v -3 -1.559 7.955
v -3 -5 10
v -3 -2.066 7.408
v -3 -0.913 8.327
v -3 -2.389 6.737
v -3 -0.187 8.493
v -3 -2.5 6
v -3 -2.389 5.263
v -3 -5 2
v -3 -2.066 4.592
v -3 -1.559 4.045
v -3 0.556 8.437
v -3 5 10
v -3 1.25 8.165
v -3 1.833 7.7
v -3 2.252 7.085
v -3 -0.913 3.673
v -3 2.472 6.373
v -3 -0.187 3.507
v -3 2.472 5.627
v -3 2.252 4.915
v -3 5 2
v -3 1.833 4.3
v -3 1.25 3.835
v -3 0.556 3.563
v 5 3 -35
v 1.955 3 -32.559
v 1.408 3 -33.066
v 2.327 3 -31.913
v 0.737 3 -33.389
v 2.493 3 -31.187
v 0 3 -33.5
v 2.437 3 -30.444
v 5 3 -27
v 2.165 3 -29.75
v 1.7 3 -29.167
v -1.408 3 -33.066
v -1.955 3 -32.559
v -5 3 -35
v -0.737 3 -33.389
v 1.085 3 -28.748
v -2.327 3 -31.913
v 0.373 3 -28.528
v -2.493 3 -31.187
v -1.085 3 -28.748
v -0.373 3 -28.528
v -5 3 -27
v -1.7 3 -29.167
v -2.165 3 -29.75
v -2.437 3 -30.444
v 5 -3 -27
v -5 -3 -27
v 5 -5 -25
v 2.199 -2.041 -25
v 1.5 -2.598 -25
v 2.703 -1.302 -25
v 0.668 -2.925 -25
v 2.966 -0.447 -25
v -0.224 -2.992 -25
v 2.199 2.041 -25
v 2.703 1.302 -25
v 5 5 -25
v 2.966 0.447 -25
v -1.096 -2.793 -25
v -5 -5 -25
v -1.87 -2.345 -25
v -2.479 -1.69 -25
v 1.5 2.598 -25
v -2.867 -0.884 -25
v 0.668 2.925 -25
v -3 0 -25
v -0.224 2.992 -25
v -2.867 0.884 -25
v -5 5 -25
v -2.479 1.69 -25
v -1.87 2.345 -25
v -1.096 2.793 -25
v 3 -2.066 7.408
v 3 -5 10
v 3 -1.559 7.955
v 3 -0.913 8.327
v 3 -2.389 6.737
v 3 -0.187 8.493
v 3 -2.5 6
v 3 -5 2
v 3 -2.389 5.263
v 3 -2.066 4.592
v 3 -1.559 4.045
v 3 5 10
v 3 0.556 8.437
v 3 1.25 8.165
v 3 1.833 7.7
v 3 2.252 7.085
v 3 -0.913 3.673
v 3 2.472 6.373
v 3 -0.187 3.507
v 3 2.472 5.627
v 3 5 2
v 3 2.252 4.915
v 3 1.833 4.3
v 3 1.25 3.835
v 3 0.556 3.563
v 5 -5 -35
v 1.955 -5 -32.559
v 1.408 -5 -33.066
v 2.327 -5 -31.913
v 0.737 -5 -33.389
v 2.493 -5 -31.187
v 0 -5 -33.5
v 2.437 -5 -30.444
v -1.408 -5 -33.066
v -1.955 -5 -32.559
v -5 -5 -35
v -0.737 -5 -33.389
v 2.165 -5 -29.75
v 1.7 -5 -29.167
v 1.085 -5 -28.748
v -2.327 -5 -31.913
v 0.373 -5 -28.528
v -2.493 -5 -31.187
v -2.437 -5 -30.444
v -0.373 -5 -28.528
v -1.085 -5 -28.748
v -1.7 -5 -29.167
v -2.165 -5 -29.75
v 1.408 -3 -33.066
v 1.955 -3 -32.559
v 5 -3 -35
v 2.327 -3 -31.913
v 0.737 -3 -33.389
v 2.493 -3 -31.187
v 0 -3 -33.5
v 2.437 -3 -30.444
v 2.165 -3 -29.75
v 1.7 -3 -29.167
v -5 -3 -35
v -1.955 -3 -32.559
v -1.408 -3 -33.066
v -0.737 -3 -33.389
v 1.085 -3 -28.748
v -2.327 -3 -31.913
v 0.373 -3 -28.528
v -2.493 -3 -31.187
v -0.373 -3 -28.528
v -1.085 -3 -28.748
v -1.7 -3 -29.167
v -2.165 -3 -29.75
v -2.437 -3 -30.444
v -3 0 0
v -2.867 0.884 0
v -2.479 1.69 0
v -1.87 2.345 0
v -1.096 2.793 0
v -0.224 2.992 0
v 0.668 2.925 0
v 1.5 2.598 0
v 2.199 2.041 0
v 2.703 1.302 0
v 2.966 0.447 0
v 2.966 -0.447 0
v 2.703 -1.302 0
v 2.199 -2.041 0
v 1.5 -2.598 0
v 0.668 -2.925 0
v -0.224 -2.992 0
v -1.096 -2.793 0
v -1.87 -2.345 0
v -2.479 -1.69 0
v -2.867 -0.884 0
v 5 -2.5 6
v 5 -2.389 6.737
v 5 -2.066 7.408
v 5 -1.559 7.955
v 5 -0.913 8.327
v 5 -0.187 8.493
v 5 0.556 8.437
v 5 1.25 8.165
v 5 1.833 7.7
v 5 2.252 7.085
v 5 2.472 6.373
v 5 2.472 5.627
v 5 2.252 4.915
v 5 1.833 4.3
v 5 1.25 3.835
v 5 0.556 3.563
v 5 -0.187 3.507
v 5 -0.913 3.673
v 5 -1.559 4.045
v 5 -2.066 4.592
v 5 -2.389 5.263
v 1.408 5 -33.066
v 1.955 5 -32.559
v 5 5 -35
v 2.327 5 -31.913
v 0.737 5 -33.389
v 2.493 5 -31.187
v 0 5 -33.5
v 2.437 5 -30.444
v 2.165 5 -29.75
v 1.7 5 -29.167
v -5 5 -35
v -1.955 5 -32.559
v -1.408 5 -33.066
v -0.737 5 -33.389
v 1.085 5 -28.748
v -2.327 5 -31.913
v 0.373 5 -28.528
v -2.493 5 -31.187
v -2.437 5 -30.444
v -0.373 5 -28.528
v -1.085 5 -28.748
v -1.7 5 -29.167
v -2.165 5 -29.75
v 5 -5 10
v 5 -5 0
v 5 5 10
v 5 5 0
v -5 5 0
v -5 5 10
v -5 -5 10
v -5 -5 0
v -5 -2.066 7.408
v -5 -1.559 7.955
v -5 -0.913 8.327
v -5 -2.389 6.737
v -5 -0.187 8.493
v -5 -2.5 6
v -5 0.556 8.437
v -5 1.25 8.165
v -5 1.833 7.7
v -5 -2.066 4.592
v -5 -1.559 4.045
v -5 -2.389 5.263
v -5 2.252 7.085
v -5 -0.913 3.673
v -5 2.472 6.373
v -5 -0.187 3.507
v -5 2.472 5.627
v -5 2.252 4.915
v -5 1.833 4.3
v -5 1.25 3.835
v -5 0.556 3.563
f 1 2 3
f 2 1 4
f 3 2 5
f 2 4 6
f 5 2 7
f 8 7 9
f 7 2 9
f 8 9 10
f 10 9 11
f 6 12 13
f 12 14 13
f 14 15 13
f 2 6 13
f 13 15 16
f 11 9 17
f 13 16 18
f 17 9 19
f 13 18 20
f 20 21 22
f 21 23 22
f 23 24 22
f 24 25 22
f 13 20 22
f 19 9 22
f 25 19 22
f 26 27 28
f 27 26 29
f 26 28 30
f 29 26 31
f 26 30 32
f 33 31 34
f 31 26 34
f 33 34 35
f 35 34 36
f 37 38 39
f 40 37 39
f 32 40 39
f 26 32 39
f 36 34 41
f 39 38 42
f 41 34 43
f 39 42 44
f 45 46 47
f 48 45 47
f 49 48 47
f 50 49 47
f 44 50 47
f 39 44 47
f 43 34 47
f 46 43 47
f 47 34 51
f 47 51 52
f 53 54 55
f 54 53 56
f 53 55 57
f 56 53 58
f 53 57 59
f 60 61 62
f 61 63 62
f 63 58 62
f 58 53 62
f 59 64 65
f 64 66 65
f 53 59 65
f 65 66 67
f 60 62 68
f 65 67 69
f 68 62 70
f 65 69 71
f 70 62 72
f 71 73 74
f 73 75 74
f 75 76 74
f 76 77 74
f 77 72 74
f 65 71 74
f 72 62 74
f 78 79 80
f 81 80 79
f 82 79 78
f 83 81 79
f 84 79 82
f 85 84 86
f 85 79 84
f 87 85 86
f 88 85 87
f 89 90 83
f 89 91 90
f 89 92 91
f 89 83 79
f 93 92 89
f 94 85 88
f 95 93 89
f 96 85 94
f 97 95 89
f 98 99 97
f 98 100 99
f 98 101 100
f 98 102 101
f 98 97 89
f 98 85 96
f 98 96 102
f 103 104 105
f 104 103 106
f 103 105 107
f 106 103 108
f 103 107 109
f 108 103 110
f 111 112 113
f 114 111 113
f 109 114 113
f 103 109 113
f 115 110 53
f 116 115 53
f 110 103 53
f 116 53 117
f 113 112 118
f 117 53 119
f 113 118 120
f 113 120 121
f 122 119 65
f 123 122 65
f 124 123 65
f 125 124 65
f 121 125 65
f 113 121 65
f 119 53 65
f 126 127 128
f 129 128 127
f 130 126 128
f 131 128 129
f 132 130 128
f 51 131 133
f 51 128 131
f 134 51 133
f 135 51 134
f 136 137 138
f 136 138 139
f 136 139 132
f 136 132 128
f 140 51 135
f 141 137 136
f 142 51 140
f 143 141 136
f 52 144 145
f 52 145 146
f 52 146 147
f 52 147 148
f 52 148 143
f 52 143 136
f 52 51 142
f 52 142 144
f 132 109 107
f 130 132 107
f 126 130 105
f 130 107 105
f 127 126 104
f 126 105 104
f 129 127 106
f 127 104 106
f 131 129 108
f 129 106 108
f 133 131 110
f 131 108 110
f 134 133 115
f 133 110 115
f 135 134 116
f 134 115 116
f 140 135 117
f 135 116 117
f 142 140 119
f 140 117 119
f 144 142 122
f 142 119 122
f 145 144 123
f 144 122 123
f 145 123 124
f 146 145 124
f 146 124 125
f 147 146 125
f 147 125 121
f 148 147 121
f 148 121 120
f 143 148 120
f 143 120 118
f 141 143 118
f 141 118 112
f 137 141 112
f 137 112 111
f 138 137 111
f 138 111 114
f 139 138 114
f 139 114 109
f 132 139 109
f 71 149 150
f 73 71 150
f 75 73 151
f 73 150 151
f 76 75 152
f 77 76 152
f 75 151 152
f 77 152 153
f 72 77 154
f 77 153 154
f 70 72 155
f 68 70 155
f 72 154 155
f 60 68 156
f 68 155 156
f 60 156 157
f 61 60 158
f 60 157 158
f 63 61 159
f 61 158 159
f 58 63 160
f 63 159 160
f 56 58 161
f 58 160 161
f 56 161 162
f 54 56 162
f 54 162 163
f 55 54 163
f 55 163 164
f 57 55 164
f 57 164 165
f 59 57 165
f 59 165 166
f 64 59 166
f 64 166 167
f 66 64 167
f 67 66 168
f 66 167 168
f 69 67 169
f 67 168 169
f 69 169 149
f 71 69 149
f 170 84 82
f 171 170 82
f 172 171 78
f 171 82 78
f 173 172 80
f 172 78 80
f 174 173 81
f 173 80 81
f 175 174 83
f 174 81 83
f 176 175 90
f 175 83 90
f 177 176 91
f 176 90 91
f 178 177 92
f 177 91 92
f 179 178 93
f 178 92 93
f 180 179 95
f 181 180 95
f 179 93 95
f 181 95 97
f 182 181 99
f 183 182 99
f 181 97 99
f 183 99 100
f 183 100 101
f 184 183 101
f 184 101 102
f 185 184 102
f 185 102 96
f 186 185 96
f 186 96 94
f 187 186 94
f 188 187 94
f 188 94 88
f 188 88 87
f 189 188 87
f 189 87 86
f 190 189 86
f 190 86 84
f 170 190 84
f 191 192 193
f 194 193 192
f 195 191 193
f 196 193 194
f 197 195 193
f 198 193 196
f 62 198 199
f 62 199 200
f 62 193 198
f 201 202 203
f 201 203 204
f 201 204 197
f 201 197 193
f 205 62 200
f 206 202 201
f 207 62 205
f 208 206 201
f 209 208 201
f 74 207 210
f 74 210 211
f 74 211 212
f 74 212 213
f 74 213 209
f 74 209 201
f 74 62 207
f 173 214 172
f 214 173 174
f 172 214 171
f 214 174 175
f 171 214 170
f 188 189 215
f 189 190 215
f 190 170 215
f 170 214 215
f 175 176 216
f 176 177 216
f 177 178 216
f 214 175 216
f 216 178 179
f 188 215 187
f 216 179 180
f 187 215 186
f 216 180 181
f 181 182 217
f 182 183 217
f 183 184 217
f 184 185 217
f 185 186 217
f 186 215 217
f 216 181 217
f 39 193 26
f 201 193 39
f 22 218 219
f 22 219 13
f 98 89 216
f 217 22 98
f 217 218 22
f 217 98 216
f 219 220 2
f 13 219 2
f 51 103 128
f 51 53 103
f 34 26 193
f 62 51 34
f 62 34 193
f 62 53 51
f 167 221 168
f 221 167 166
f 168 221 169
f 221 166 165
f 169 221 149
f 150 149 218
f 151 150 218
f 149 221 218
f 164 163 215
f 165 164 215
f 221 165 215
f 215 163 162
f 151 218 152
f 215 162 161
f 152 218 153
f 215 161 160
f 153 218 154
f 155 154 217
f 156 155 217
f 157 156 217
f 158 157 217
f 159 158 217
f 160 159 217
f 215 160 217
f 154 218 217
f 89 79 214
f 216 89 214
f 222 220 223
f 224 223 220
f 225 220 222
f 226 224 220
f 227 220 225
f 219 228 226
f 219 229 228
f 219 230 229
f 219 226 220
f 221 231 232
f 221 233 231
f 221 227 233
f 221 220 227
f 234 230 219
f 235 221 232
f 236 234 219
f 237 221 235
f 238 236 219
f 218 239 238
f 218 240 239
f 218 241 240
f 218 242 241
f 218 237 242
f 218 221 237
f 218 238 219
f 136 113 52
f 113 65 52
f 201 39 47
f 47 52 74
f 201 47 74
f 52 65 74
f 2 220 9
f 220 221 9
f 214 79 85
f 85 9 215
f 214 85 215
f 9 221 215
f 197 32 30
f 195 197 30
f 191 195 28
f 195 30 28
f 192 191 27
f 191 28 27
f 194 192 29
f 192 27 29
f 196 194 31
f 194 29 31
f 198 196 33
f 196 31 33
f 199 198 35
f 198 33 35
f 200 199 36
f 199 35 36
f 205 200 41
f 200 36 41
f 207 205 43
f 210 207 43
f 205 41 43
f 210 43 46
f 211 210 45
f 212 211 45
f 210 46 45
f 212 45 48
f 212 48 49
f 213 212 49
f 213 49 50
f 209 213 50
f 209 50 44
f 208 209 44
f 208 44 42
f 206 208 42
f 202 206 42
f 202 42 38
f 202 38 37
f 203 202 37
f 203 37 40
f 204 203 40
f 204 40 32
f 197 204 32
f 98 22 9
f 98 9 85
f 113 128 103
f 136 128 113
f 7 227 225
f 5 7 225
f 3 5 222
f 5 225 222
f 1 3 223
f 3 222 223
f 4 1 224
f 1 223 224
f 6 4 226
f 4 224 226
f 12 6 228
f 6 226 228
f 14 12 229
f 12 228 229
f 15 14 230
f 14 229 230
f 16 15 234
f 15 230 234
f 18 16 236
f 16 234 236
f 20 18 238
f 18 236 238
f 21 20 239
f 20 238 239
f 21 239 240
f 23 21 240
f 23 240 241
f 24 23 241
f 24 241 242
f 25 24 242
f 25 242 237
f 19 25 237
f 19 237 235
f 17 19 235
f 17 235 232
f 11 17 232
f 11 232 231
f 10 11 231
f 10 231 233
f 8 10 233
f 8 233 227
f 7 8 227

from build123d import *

# Parameters (mm, degrees)
SKETCH1_W           = 10
SKETCH1_H           = 10
BOSS_EXTRUDE1_DEPTH = 2
SKETCH2_W           = 2
SKETCH2_H           = 10
BOSS_EXTRUDE2_DEPTH = 8
SKETCH3_R           = 2.5
CUT_EXTRUDE1_DEPTH  = 16
SKETCH4_R           = 3
BOSS_EXTRUDE3_DEPTH = 25
SKETCH5_W           = 10
SKETCH5_H           = 10
BOSS_EXTRUDE4_DEPTH = 2
SKETCH6_W           = 10
SKETCH6_H           = 2
BOSS_EXTRUDE5_DEPTH = 8
SKETCH7_R           = 2.5
CUT_EXTRUDE2_DEPTH  = 37.742346142


with BuildPart() as part:
    # Sketch1 → Boss-Extrude1 (new body)
    with BuildSketch(Plane.XY):
        Rectangle(SKETCH1_W, SKETCH1_H)
    extrude(amount=BOSS_EXTRUDE1_DEPTH)

    # Sketch2 → Boss-Extrude2 (add)
    with BuildSketch(Plane.XY.offset(2)):
        with Locations((-4, 0)):
            Rectangle(SKETCH2_W, SKETCH2_H)
        with Locations((4, 0)):
            Rectangle(SKETCH2_W, SKETCH2_H)
    extrude(amount=BOSS_EXTRUDE2_DEPTH)

    # Sketch3 → Cut-Extrude1 (cut, through all)
    with BuildSketch(Plane.ZY.offset(5)):
        with Locations(Location((6, 0, 0), (0, 0, 270))):
            Circle(SKETCH3_R)
    extrude(amount=-CUT_EXTRUDE1_DEPTH, mode=Mode.SUBTRACT)

    # Sketch4 → Boss-Extrude3 (add)
    with BuildSketch(Plane(origin=(0, 0, 0), x_dir=(-1, 0, 0), z_dir=(0, 0, -1))):
        Circle(SKETCH4_R)
    extrude(amount=BOSS_EXTRUDE3_DEPTH)

    # Sketch5 → Boss-Extrude4 (add)
    with BuildSketch(Plane(origin=(0, 0, -25), x_dir=(-1, 0, 0), z_dir=(0, 0, -1))):
        Rectangle(SKETCH5_W, SKETCH5_H)
    extrude(amount=BOSS_EXTRUDE4_DEPTH)

    # Sketch6 → Boss-Extrude5 (add)
    with BuildSketch(Plane(origin=(0, 0, -27), x_dir=(-1, 0, 0), z_dir=(0, 0, -1))):
        with Locations((0, -4)):
            Rectangle(SKETCH6_W, SKETCH6_H)
        with Locations((0, 4)):
            Rectangle(SKETCH6_W, SKETCH6_H)
    extrude(amount=BOSS_EXTRUDE5_DEPTH)

    # Sketch7 → Cut-Extrude2 (cut, through all)
    with BuildSketch(Plane.XZ.offset(5)):
        with Locations(Location((0, -31, 0), (0, 0, 270))):
            Circle(SKETCH7_R)
    extrude(amount=-CUT_EXTRUDE2_DEPTH, mode=Mode.SUBTRACT)


solid = part.part
